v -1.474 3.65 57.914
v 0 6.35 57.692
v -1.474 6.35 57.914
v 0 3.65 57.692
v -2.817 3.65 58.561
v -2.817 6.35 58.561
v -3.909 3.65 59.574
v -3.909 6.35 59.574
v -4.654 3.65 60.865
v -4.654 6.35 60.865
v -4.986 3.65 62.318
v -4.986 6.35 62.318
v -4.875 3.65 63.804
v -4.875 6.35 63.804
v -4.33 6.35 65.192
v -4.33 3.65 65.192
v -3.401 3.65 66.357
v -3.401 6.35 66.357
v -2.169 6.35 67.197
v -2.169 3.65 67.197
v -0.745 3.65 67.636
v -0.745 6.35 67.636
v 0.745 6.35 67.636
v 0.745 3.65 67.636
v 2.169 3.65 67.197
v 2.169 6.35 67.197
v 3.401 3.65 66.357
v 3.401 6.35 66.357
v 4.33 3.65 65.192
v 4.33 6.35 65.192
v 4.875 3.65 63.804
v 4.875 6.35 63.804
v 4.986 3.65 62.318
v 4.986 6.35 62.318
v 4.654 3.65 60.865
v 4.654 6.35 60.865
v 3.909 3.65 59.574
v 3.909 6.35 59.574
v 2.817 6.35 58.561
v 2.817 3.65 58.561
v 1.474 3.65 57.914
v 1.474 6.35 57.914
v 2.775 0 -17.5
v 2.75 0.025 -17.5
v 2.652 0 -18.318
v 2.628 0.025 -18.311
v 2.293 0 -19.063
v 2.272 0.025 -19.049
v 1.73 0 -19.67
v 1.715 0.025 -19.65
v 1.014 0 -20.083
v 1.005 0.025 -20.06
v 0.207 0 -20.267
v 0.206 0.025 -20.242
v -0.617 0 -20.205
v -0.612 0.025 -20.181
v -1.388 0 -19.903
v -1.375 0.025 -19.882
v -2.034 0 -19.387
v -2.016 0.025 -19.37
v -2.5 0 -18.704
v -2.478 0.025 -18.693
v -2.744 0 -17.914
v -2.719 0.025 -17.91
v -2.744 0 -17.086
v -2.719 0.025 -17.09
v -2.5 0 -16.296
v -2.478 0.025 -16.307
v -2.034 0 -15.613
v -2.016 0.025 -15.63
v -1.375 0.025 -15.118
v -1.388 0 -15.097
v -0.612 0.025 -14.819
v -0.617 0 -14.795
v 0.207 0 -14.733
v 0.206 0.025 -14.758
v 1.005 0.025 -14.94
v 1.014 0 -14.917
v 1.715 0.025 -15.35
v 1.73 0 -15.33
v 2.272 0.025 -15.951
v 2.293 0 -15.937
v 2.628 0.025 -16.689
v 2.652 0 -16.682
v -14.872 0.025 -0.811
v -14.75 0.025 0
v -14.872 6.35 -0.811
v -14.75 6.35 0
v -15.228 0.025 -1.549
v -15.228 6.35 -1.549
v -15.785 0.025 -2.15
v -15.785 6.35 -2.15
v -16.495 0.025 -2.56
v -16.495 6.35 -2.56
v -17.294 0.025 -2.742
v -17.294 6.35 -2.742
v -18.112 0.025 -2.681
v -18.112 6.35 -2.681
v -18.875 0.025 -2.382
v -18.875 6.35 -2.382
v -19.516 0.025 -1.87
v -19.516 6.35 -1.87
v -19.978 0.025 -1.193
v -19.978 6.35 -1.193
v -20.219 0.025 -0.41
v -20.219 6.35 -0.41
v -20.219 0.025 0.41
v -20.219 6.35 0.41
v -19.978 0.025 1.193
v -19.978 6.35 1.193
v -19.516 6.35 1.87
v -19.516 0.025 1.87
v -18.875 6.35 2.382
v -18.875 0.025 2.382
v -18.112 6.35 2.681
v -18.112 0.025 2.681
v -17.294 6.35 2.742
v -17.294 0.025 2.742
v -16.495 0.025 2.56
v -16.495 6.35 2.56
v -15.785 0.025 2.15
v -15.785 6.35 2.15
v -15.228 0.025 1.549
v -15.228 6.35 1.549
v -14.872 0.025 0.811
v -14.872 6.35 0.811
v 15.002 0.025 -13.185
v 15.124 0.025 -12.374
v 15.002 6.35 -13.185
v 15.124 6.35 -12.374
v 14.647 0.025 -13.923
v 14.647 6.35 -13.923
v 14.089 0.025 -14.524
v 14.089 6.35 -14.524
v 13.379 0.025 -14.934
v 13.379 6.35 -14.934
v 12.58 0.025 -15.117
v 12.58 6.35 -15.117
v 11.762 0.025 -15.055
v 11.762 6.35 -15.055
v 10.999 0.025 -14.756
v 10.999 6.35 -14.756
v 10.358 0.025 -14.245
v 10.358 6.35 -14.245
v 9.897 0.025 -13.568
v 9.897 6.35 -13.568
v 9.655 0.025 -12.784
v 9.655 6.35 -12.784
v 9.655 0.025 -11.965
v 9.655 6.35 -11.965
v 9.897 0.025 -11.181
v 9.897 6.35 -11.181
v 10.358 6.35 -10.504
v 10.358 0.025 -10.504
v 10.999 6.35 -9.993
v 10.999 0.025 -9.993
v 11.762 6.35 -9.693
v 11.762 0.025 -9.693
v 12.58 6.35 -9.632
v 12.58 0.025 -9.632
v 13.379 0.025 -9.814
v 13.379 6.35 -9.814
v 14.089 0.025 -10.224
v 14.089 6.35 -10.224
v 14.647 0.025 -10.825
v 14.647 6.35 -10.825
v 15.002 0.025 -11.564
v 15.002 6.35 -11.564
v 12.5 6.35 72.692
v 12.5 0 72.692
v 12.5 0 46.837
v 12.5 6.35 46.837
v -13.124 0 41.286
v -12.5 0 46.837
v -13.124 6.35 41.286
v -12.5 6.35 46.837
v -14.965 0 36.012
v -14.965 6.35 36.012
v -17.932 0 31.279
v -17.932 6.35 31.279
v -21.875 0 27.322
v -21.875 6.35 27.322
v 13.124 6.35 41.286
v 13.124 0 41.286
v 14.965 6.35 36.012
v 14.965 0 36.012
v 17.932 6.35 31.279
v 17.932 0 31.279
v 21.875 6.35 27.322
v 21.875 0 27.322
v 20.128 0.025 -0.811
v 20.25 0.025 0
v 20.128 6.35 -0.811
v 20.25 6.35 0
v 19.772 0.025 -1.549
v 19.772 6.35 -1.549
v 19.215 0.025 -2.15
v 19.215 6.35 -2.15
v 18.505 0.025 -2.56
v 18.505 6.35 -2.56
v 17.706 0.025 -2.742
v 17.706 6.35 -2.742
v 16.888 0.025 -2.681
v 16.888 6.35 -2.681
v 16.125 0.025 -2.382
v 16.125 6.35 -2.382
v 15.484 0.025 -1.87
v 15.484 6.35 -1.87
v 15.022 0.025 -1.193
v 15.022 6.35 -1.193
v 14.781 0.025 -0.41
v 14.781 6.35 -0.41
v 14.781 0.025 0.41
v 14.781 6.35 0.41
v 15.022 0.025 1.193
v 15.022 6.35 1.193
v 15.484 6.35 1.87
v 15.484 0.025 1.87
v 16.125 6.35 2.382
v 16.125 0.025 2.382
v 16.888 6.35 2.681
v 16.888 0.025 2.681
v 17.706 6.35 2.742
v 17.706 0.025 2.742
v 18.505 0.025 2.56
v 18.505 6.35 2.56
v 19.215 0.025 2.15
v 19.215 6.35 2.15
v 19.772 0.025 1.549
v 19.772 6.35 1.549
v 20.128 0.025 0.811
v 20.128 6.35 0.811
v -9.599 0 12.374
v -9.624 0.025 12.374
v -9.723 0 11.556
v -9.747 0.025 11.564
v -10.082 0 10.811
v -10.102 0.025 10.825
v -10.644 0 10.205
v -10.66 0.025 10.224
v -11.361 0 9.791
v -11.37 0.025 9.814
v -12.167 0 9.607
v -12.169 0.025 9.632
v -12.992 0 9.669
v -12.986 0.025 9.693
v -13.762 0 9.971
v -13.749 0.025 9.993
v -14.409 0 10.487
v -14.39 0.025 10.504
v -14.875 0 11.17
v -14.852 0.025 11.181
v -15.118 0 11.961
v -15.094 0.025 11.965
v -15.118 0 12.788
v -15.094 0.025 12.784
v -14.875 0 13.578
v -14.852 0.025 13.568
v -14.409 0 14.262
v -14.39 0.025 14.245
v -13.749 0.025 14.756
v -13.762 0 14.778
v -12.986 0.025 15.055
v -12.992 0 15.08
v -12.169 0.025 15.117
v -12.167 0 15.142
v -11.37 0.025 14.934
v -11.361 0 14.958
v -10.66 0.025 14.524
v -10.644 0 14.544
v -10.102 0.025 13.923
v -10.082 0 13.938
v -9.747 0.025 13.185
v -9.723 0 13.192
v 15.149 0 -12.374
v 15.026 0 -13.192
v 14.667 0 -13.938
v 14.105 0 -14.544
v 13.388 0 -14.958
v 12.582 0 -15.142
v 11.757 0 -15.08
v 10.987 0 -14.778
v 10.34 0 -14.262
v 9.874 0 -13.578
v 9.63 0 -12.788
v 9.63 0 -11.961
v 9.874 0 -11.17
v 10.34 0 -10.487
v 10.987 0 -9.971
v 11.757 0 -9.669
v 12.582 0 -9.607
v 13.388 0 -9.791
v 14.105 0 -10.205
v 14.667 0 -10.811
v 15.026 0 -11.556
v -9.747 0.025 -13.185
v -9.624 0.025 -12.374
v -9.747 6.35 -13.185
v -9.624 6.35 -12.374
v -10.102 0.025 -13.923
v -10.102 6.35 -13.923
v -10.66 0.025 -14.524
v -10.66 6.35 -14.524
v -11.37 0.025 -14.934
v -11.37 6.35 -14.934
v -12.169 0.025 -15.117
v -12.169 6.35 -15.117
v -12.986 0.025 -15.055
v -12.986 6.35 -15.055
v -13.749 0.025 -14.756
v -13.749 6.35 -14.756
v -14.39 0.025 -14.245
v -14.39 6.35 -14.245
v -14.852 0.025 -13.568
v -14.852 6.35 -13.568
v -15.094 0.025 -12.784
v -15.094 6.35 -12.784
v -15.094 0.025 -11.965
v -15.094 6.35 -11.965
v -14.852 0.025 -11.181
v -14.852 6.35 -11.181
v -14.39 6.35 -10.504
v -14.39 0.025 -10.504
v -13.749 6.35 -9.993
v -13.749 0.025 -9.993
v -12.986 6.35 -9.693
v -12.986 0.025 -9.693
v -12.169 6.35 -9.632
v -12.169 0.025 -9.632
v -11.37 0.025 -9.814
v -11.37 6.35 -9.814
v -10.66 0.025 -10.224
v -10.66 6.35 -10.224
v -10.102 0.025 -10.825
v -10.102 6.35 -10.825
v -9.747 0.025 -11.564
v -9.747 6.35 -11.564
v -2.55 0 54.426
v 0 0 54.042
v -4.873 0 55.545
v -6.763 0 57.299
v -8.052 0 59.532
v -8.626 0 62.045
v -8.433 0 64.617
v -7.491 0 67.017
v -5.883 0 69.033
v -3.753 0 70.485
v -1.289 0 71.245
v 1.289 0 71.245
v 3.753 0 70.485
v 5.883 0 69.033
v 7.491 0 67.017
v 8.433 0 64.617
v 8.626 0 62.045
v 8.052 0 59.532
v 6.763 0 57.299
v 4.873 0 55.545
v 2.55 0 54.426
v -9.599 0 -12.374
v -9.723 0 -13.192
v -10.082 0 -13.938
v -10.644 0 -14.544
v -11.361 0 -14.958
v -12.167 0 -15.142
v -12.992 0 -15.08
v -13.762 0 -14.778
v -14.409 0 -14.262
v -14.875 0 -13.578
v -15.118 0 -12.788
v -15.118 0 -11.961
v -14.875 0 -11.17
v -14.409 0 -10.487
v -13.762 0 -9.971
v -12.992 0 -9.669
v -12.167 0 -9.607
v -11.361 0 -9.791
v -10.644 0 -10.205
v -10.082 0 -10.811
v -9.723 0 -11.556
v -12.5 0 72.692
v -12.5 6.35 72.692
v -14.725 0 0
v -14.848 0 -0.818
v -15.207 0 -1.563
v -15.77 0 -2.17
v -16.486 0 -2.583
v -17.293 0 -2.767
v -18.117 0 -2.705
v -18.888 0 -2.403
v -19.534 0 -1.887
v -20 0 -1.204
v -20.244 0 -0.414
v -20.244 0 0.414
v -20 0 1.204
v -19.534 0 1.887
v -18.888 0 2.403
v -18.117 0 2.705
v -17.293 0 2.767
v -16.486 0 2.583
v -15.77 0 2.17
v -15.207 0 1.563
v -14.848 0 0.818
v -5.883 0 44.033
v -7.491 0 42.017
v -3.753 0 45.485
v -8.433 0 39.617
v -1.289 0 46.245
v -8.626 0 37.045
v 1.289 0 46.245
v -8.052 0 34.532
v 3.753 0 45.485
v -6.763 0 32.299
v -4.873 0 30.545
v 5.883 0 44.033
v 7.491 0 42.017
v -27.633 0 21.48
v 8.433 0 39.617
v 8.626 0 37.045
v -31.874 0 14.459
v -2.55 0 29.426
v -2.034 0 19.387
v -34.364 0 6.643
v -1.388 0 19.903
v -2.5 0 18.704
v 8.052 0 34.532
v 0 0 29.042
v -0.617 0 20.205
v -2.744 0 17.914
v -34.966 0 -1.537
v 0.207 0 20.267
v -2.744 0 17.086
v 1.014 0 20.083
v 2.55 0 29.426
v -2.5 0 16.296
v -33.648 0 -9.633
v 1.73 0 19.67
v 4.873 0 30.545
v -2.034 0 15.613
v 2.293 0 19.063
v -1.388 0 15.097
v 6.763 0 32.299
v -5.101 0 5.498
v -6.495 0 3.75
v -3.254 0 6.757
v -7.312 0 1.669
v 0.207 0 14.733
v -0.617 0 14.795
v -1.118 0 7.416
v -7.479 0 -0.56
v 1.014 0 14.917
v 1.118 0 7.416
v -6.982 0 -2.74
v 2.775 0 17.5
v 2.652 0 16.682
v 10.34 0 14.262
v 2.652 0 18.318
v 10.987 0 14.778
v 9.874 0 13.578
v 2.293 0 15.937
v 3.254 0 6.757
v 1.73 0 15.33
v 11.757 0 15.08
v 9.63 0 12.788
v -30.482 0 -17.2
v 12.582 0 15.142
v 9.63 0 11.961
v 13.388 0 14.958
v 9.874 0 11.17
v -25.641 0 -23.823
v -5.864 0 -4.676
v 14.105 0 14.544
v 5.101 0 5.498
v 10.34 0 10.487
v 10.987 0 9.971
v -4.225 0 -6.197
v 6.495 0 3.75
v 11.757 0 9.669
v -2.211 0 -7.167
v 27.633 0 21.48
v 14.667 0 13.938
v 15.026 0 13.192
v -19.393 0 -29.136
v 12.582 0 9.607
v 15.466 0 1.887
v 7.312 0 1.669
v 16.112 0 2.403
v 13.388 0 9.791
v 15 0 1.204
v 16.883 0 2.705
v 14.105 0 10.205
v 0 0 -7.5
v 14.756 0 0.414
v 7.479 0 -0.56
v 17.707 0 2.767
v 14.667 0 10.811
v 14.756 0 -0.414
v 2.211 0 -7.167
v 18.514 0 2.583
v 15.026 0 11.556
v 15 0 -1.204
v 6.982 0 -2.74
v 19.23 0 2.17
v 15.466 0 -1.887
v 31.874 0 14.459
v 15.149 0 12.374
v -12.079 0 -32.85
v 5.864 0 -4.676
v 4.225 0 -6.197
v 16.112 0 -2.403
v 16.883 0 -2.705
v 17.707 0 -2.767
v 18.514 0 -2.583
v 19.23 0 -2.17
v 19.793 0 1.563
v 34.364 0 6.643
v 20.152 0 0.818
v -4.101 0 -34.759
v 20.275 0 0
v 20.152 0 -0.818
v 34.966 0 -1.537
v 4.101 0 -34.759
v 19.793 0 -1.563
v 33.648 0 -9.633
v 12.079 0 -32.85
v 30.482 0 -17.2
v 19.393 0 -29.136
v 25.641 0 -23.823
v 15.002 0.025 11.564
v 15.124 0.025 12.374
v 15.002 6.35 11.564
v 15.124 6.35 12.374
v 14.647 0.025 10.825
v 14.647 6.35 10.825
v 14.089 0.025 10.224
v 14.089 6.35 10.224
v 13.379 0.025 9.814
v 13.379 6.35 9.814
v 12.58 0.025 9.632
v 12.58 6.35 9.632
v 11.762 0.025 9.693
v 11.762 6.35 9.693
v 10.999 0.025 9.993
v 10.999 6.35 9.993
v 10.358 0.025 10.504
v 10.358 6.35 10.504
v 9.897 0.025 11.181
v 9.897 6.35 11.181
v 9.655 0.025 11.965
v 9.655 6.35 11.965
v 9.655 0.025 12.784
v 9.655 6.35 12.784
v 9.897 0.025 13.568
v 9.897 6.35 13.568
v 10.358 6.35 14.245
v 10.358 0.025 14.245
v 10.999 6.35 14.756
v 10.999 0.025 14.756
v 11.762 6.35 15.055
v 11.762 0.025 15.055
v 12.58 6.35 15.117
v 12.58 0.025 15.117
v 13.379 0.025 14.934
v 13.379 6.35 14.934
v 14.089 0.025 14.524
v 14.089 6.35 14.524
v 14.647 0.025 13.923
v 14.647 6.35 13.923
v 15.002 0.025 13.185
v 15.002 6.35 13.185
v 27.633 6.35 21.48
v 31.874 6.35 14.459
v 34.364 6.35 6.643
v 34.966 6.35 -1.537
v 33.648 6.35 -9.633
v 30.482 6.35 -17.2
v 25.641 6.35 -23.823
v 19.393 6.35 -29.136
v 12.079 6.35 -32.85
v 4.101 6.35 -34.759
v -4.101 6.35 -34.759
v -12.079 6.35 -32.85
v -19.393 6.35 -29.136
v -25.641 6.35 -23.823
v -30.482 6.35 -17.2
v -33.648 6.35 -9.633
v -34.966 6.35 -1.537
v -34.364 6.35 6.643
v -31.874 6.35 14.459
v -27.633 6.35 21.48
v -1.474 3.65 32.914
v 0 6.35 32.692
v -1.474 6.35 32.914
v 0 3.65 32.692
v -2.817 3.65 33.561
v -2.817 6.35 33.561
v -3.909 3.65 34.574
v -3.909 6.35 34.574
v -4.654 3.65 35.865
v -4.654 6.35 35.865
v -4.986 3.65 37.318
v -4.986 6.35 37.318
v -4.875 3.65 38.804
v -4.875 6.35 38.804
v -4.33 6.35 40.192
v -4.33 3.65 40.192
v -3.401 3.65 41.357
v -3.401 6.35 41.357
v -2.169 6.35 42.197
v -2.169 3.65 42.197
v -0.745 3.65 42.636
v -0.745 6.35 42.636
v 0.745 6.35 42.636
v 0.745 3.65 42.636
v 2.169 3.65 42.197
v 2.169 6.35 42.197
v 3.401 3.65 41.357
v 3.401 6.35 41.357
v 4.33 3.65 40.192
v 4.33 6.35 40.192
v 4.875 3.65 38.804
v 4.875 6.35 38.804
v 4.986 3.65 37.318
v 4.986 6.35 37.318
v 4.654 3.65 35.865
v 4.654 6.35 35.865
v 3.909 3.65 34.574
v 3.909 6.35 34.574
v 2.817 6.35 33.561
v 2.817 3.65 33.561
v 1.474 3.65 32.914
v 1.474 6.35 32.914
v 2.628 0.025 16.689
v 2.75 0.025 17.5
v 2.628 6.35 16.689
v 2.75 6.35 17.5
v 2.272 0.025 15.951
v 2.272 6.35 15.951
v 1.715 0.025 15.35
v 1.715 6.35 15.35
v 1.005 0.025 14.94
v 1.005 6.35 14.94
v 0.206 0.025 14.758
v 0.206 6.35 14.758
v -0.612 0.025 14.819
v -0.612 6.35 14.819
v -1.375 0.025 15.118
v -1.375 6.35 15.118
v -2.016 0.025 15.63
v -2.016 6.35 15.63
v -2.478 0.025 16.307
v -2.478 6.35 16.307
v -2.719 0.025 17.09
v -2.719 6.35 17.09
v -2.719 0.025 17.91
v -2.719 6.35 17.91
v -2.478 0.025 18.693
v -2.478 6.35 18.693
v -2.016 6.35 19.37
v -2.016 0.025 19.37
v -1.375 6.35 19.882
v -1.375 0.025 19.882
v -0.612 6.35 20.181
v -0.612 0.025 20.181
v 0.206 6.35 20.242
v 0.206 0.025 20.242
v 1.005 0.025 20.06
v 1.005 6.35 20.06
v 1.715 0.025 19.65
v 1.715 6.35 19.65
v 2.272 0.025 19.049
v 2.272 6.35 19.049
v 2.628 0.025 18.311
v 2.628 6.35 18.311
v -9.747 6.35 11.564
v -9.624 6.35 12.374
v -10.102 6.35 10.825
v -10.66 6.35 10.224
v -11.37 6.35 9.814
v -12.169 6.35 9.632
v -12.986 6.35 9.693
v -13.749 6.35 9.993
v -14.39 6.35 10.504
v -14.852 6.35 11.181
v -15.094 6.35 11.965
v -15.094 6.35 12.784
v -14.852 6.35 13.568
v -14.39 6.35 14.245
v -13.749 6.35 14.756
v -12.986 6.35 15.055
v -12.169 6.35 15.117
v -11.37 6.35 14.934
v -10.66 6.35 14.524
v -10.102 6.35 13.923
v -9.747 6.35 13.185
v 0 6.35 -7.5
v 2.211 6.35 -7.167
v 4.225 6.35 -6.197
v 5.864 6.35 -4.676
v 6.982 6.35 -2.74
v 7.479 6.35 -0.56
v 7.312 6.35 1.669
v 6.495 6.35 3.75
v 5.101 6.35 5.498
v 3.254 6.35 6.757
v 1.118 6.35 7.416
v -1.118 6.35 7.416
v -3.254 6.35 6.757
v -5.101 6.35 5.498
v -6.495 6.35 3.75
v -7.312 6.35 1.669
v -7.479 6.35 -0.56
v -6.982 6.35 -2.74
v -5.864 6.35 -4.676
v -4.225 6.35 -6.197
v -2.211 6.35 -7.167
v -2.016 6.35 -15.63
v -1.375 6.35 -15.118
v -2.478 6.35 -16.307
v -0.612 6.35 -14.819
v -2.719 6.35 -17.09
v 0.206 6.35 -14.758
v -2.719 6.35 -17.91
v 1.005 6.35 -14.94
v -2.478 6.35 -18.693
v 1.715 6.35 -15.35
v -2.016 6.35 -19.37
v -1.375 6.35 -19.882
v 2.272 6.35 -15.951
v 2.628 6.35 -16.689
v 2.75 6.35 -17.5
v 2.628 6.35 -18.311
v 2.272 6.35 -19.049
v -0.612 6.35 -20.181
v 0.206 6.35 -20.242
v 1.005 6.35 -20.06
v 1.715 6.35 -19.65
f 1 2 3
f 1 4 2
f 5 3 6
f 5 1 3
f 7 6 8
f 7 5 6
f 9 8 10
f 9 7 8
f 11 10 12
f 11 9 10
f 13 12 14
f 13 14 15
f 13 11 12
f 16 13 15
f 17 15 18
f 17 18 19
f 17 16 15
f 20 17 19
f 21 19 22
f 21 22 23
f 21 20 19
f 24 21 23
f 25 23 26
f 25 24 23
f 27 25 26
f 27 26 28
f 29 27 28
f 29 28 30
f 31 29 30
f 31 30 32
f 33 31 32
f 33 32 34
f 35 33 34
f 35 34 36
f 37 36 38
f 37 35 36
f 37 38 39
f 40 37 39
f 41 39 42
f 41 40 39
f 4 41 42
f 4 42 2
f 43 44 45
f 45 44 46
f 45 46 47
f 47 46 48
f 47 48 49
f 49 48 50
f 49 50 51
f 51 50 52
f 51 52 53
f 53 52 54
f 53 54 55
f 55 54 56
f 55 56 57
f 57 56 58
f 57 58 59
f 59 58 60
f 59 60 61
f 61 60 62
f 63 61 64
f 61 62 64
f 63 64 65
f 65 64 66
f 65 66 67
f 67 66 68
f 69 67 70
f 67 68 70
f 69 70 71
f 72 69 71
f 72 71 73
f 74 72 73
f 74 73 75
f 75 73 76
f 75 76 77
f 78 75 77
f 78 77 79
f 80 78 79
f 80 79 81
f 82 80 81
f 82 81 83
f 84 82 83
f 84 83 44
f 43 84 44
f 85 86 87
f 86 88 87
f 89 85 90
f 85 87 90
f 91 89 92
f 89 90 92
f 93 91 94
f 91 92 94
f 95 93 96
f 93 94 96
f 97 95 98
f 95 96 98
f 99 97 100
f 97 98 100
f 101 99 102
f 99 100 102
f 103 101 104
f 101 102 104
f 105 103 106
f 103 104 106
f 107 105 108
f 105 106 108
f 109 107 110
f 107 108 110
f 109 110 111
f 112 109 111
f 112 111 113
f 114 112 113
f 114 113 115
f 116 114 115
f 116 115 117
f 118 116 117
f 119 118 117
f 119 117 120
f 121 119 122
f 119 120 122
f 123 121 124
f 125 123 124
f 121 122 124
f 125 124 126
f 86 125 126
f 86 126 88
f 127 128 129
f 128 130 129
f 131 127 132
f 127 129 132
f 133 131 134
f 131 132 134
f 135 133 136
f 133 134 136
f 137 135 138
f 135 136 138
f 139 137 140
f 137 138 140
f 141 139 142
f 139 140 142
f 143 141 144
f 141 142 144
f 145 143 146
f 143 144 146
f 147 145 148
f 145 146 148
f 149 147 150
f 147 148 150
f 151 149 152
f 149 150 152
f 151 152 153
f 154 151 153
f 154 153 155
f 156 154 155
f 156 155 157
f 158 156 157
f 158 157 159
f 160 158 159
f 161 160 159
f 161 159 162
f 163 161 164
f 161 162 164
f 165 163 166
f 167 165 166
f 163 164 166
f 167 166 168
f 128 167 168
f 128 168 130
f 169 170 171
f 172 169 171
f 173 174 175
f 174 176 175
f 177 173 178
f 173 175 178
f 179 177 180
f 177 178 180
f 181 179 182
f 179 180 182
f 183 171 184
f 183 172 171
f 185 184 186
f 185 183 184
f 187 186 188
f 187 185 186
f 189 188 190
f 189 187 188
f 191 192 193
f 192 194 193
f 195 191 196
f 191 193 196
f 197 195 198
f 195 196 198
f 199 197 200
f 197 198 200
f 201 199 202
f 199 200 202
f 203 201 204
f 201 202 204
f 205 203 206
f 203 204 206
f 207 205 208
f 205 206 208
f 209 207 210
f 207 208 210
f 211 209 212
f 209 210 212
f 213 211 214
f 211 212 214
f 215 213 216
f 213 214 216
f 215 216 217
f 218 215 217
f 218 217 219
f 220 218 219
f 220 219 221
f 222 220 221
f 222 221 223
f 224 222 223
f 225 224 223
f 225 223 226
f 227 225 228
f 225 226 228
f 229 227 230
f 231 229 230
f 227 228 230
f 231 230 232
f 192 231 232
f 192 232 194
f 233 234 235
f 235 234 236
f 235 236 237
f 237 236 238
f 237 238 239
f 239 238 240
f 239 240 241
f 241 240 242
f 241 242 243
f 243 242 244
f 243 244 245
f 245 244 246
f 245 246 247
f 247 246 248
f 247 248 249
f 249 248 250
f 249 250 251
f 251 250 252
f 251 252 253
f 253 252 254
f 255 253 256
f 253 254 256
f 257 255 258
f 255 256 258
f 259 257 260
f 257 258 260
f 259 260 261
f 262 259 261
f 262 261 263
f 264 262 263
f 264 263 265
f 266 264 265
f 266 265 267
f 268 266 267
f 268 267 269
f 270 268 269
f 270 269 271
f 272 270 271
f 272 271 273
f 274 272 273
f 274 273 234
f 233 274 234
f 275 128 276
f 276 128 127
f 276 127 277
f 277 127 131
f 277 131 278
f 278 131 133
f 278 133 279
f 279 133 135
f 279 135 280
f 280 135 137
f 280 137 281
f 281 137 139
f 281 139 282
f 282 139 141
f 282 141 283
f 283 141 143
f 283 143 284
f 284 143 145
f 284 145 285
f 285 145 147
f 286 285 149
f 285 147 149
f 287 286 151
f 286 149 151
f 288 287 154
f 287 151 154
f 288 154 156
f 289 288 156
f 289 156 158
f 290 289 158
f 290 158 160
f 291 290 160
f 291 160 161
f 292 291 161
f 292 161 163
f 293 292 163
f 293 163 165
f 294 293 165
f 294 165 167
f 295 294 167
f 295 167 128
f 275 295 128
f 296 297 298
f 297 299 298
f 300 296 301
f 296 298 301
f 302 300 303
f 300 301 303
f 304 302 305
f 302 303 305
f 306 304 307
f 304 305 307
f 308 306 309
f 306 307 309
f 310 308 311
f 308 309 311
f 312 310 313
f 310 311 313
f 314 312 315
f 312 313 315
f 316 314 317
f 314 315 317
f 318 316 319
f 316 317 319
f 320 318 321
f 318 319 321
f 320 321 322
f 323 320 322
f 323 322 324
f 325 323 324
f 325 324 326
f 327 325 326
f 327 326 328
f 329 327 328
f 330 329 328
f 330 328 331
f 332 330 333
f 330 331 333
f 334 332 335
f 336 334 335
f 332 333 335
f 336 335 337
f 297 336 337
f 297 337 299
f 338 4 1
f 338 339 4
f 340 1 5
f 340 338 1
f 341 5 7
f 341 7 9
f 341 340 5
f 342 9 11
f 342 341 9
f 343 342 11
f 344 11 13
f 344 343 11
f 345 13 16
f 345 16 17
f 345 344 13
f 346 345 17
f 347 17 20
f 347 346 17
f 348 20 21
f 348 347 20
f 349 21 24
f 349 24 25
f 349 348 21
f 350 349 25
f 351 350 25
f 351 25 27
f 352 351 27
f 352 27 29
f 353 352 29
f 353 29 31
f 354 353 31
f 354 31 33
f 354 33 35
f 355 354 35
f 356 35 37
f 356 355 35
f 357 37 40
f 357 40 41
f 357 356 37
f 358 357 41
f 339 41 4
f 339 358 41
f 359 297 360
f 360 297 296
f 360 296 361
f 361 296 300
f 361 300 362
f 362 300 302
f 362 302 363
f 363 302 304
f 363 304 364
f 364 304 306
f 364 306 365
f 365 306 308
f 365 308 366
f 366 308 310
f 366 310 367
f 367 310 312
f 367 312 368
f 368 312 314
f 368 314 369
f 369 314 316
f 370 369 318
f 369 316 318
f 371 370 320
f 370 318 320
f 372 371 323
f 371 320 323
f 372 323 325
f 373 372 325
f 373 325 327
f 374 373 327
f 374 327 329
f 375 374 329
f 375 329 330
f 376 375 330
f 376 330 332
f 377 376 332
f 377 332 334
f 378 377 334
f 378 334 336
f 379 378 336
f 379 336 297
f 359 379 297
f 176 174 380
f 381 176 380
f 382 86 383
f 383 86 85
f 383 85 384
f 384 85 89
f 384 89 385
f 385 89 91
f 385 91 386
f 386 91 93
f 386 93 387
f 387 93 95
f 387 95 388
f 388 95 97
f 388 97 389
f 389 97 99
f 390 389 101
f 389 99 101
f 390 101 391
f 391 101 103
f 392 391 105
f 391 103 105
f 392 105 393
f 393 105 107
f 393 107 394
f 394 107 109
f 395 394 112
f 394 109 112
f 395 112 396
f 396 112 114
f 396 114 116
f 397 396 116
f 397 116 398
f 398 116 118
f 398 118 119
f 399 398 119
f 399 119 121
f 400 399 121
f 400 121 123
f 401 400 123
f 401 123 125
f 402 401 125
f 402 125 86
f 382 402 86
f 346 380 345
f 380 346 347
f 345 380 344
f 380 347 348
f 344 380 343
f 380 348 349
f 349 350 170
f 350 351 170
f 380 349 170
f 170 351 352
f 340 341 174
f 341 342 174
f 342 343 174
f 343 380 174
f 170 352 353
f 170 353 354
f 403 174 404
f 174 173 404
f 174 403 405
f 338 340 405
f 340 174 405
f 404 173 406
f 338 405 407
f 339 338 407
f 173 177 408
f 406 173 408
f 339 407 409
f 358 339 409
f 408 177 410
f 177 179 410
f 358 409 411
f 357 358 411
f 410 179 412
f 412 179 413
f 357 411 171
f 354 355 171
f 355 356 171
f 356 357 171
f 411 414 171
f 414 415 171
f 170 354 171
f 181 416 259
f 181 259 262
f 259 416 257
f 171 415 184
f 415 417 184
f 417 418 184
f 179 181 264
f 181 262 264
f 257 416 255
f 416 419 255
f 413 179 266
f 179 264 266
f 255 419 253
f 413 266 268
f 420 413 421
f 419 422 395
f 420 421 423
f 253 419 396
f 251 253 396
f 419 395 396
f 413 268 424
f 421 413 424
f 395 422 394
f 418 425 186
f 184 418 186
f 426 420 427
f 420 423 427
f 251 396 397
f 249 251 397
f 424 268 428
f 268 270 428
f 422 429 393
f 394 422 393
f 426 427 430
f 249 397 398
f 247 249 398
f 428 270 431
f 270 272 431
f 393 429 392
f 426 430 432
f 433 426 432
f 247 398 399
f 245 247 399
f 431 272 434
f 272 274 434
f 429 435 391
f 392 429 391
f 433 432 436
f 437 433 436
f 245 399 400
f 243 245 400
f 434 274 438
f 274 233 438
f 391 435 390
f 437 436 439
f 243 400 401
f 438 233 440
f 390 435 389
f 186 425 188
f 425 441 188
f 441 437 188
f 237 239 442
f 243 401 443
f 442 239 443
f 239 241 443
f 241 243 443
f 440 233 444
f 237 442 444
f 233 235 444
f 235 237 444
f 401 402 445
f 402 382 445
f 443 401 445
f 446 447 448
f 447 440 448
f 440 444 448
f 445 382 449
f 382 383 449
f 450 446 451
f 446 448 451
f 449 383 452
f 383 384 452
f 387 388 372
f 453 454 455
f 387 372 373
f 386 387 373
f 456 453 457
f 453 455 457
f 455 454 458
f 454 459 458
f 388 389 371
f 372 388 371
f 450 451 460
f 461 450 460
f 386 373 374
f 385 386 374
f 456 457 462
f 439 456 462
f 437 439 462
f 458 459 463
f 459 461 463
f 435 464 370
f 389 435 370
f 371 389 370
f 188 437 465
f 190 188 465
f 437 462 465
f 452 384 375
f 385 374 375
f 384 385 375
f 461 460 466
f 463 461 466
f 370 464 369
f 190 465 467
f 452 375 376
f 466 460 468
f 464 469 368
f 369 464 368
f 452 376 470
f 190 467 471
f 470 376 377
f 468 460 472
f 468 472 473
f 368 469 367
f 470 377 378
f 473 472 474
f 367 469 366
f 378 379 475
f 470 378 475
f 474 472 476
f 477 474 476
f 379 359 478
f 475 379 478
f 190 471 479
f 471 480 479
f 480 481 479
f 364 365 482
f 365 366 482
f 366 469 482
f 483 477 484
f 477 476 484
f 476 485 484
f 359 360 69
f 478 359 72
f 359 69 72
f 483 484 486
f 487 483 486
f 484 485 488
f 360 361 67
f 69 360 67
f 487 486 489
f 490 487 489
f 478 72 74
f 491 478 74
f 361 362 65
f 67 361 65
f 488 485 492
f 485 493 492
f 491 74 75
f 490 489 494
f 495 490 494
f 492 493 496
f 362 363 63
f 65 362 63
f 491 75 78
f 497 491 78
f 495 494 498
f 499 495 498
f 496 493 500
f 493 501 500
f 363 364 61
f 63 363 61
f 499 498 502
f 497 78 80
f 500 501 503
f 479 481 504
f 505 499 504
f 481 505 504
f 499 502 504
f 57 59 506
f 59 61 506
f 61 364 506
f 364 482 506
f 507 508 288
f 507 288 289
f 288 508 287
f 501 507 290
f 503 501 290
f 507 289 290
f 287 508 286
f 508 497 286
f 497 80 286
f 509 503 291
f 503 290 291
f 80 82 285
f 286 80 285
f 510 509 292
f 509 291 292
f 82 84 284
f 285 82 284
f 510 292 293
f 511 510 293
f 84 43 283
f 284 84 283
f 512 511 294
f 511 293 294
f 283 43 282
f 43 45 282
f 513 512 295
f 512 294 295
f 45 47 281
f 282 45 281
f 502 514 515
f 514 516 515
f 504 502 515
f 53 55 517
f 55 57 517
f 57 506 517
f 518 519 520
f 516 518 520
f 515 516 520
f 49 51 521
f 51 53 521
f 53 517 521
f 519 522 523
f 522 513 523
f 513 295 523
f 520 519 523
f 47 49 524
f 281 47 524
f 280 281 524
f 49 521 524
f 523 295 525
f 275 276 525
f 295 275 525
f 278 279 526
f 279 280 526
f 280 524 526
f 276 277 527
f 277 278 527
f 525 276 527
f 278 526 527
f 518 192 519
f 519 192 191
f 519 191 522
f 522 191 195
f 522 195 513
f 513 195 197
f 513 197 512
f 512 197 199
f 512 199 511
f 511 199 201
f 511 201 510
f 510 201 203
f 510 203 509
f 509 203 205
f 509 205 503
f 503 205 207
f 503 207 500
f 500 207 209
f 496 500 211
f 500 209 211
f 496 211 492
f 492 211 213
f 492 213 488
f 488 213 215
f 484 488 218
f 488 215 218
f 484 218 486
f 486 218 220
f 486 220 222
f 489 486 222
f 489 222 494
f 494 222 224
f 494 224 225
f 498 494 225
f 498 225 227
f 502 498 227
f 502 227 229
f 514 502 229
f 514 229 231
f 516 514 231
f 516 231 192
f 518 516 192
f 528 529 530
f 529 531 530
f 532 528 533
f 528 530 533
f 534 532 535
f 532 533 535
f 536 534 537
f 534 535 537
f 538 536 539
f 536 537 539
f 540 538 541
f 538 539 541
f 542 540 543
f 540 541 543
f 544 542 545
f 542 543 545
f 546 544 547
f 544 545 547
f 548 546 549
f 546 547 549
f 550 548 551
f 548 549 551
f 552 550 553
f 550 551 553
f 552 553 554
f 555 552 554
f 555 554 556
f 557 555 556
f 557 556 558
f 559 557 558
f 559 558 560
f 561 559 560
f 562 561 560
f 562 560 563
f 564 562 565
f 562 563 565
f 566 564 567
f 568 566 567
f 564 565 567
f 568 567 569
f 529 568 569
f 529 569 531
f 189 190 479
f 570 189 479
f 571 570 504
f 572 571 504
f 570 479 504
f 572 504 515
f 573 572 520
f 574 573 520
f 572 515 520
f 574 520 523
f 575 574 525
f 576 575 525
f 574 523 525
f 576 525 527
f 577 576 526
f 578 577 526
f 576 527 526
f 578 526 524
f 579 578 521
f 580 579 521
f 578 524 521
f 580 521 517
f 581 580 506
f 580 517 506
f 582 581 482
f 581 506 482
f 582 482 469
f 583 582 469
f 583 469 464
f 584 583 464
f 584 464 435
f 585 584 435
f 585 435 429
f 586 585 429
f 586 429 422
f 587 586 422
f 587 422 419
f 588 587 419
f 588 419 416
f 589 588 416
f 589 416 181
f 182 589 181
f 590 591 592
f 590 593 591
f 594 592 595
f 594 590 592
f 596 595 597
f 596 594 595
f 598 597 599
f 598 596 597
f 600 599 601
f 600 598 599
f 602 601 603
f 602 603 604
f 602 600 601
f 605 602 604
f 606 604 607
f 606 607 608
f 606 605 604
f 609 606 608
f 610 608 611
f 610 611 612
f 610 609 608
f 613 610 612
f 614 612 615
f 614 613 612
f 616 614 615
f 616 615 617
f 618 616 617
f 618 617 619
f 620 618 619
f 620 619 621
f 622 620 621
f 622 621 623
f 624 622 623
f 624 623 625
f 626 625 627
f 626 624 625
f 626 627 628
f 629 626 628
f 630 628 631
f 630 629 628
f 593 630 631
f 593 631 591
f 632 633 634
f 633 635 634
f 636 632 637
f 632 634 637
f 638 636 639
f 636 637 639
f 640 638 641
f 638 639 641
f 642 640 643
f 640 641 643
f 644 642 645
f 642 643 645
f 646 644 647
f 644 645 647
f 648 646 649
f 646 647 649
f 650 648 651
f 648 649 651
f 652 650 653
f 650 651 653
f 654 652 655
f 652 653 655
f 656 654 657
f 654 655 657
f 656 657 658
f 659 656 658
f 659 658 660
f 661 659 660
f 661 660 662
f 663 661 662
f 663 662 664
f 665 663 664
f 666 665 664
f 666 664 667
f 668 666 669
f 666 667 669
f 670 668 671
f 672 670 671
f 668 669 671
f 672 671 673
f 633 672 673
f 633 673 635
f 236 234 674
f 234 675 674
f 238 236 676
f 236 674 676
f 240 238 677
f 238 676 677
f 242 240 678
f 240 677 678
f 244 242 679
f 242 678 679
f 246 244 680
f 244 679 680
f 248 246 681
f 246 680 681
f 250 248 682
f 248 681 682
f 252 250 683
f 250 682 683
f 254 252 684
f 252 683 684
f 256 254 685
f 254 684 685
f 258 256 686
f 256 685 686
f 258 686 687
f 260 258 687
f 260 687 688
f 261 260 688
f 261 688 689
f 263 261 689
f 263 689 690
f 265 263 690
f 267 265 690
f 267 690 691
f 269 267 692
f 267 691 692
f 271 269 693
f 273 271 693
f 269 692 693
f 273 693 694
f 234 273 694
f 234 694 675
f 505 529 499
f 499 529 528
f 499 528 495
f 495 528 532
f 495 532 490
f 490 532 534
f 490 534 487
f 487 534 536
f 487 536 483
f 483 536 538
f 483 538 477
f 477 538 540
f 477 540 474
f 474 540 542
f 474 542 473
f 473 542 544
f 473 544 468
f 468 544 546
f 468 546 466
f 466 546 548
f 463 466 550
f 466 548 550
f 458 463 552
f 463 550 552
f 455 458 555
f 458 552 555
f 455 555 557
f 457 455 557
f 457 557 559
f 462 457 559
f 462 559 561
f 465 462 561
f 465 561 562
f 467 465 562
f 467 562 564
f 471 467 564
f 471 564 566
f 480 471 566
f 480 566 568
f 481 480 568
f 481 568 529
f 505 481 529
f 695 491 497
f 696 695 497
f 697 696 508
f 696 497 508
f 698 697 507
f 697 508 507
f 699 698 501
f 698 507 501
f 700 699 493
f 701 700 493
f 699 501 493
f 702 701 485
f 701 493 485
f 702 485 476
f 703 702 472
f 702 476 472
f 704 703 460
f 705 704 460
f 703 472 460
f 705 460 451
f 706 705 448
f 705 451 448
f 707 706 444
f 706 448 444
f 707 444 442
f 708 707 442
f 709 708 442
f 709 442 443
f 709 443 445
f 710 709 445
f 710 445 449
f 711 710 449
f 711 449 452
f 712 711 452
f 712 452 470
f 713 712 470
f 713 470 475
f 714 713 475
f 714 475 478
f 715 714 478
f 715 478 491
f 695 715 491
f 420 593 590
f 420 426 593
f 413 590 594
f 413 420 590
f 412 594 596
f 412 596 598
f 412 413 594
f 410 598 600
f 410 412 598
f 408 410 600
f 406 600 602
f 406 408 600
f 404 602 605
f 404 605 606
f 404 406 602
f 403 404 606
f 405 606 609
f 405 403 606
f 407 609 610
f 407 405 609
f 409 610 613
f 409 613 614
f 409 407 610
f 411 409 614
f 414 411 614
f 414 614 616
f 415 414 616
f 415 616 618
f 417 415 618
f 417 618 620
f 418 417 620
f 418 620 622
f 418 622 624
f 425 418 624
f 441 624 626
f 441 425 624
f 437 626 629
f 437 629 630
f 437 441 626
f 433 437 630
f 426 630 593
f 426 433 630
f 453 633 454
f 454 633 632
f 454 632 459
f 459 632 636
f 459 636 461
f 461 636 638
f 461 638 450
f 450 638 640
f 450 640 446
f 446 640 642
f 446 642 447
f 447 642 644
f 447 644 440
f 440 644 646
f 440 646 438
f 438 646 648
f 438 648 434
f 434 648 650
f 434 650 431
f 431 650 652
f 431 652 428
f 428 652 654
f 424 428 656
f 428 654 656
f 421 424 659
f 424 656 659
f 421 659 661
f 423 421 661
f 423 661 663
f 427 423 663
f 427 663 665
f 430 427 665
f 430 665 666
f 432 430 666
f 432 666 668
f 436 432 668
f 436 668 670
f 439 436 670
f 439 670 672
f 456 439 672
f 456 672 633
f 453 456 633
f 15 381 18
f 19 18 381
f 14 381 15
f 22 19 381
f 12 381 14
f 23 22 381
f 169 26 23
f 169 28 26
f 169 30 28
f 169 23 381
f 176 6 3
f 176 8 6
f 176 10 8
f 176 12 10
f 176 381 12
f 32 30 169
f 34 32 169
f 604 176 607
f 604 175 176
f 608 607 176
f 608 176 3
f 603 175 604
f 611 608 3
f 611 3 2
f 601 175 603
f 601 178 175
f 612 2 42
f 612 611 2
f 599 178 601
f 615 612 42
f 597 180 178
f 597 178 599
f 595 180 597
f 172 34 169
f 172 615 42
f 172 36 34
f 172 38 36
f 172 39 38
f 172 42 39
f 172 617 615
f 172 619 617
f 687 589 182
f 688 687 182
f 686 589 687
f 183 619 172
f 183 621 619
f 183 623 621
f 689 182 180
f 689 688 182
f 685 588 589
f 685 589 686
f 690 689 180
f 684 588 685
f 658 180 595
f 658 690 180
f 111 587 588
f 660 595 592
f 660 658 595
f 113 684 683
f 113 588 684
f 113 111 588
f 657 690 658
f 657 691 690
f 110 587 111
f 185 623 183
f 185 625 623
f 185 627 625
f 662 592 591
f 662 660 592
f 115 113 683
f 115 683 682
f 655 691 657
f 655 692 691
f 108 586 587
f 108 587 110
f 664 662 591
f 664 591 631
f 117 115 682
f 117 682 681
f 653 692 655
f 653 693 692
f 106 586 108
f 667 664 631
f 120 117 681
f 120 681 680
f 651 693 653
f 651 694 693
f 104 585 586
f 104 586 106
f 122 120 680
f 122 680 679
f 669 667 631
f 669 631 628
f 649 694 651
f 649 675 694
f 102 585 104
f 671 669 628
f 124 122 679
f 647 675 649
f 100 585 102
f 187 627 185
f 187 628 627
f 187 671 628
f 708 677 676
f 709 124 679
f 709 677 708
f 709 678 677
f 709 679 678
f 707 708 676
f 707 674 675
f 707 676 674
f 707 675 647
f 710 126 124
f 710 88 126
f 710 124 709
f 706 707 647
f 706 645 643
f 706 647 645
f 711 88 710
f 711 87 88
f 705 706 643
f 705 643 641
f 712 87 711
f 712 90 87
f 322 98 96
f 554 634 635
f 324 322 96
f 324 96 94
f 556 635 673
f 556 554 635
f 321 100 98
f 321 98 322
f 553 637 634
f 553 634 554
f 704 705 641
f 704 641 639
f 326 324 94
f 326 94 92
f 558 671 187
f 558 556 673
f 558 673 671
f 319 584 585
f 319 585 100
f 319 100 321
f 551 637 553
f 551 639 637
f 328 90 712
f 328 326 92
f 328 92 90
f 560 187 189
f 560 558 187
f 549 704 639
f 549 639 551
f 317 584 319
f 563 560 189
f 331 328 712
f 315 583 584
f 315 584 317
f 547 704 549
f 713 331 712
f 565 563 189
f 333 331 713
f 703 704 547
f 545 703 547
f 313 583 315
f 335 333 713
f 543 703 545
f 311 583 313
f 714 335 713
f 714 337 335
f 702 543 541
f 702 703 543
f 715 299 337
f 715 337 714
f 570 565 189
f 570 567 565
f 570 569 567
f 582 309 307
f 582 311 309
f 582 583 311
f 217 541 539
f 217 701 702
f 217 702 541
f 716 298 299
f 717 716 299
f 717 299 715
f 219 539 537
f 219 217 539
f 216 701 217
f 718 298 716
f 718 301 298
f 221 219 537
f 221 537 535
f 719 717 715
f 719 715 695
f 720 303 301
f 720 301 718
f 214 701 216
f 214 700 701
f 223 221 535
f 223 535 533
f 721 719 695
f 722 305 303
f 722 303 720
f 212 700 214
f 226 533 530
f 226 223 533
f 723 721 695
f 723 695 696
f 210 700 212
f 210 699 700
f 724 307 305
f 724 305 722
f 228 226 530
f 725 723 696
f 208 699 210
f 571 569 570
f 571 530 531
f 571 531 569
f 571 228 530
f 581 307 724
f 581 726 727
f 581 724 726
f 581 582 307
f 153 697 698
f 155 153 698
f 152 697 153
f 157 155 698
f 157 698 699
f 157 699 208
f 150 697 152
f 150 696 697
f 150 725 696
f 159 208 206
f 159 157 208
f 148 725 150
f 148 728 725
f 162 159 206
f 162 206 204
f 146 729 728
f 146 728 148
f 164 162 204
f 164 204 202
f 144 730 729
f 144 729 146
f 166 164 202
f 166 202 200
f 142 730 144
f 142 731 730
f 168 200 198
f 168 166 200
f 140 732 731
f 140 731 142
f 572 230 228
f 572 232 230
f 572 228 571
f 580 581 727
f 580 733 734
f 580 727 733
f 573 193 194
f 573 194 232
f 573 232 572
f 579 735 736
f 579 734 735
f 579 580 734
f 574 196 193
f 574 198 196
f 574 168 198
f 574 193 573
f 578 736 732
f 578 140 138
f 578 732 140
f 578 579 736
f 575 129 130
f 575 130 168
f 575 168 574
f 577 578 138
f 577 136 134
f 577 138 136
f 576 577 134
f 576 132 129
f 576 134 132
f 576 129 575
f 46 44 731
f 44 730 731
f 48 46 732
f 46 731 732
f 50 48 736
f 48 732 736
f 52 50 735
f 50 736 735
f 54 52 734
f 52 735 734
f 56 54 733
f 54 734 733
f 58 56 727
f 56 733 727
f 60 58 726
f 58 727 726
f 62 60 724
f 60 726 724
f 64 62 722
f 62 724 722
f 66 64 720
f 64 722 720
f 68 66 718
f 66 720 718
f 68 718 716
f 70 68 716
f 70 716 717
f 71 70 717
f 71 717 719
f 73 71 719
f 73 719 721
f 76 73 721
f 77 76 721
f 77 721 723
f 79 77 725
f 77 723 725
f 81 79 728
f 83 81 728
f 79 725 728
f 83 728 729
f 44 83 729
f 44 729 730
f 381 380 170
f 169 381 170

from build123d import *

# Parameters (mm, degrees)
BOSS_EXTRUDE1_DEPTH                            = 6.35
M5_CLEARANCE_HOLE1_D                           = 5.5
M5_CLEARANCE_HOLE1_CSINK_D                     = 5.55
M5_CLEARANCE_HOLE1_CSINK_ANGLE                 = 90
SKETCH5_R                                      = 7.5
CUT_EXTRUDE1_DEPTH                             = 81.928436696
CSK_FOR_M8_FLAT_HEAD_MACHINE_SCREW1_AT_2_COUNT = 2
CSK_FOR_M8_FLAT_HEAD_MACHINE_SCREW1_AT_2_PITCH = 25
FILLET1_R                                      = 25


with BuildPart() as part:
    # Sketch1 → Boss-Extrude1 (new body)
    with BuildSketch(Plane(origin=(0, 0, 0), x_dir=(1, 0, 0), z_dir=(0, 1, 0))):
        with BuildLine():
            Line((-12.5, -72.691742077), (12.5, -72.691742077))
            Line((12.5, -72.691742077), (12.5, -32.691742077))
            ThreePointArc((12.5, -32.691742077), (0, 35), (-12.5, -32.691742077))
            Line((-12.5, -32.691742077), (-12.5, -72.691742077))
        make_face()
    extrude(amount=BOSS_EXTRUDE1_DEPTH)

    # M5 Clearance Hole1 (through all)
    with Locations(Plane(origin=(0, 0, 0), x_dir=(-1, 0, 0), z_dir=(0, -1, 0))):
        with Locations((0, 17.5), (12.374368671, 12.374368671), (17.5, 0), (12.374368671, -12.374368671), (0, -17.5), (-12.374368671, -12.374368671), (-17.5, 0), (-12.374368671, 12.374368671)):
            CounterSinkHole(M5_CLEARANCE_HOLE1_D / 2, M5_CLEARANCE_HOLE1_CSINK_D / 2, counter_sink_angle=M5_CLEARANCE_HOLE1_CSINK_ANGLE)

    # Sketch5 → Cut-Extrude1 (cut, through all)
    with BuildSketch(Plane.XZ):
        with Locations(Location((0, 0, 0), (0, 0, 270))):
            Circle(SKETCH5_R)
    extrude(amount=-CUT_EXTRUDE1_DEPTH, mode=Mode.SUBTRACT)

    # Sketch8 → CSK for M8 Flat Head Machine Screw1 (revolve, cut)
    with BuildSketch(Plane(origin=(0, 0, 37.691742077), x_dir=(0, 0, -1), z_dir=(1, 0, 0))):
        Polygon((0, 0), (0, 6.35), (5, 6.35), (5, 3.65), (8.65, 0), align=None)
    csk_for_m8_flat_head_machine_screw1 = revolve(axis=Axis((0, -6.35, 37.691742077), (0, 1, 0)), mode=Mode.SUBTRACT)

    # CSK for M8 Flat Head Machine Screw1 at 2: CSK for M8 Flat Head Machine Screw1 ×2
    with Locations(*[(0, 0, i * CSK_FOR_M8_FLAT_HEAD_MACHINE_SCREW1_AT_2_PITCH) for i in range(1, CSK_FOR_M8_FLAT_HEAD_MACHINE_SCREW1_AT_2_COUNT)]):
        add(csk_for_m8_flat_head_machine_screw1, mode=Mode.SUBTRACT)

    # Fillet1
    fillet1_edges = [part.edges().sort_by_distance(p)[0] for p in [
        (-12.5, 3.175, 32.691742077),
        (12.5, 3.175, 32.691742077),
    ]]
    fillet(fillet1_edges, radius=FILLET1_R)


solid = part.part
